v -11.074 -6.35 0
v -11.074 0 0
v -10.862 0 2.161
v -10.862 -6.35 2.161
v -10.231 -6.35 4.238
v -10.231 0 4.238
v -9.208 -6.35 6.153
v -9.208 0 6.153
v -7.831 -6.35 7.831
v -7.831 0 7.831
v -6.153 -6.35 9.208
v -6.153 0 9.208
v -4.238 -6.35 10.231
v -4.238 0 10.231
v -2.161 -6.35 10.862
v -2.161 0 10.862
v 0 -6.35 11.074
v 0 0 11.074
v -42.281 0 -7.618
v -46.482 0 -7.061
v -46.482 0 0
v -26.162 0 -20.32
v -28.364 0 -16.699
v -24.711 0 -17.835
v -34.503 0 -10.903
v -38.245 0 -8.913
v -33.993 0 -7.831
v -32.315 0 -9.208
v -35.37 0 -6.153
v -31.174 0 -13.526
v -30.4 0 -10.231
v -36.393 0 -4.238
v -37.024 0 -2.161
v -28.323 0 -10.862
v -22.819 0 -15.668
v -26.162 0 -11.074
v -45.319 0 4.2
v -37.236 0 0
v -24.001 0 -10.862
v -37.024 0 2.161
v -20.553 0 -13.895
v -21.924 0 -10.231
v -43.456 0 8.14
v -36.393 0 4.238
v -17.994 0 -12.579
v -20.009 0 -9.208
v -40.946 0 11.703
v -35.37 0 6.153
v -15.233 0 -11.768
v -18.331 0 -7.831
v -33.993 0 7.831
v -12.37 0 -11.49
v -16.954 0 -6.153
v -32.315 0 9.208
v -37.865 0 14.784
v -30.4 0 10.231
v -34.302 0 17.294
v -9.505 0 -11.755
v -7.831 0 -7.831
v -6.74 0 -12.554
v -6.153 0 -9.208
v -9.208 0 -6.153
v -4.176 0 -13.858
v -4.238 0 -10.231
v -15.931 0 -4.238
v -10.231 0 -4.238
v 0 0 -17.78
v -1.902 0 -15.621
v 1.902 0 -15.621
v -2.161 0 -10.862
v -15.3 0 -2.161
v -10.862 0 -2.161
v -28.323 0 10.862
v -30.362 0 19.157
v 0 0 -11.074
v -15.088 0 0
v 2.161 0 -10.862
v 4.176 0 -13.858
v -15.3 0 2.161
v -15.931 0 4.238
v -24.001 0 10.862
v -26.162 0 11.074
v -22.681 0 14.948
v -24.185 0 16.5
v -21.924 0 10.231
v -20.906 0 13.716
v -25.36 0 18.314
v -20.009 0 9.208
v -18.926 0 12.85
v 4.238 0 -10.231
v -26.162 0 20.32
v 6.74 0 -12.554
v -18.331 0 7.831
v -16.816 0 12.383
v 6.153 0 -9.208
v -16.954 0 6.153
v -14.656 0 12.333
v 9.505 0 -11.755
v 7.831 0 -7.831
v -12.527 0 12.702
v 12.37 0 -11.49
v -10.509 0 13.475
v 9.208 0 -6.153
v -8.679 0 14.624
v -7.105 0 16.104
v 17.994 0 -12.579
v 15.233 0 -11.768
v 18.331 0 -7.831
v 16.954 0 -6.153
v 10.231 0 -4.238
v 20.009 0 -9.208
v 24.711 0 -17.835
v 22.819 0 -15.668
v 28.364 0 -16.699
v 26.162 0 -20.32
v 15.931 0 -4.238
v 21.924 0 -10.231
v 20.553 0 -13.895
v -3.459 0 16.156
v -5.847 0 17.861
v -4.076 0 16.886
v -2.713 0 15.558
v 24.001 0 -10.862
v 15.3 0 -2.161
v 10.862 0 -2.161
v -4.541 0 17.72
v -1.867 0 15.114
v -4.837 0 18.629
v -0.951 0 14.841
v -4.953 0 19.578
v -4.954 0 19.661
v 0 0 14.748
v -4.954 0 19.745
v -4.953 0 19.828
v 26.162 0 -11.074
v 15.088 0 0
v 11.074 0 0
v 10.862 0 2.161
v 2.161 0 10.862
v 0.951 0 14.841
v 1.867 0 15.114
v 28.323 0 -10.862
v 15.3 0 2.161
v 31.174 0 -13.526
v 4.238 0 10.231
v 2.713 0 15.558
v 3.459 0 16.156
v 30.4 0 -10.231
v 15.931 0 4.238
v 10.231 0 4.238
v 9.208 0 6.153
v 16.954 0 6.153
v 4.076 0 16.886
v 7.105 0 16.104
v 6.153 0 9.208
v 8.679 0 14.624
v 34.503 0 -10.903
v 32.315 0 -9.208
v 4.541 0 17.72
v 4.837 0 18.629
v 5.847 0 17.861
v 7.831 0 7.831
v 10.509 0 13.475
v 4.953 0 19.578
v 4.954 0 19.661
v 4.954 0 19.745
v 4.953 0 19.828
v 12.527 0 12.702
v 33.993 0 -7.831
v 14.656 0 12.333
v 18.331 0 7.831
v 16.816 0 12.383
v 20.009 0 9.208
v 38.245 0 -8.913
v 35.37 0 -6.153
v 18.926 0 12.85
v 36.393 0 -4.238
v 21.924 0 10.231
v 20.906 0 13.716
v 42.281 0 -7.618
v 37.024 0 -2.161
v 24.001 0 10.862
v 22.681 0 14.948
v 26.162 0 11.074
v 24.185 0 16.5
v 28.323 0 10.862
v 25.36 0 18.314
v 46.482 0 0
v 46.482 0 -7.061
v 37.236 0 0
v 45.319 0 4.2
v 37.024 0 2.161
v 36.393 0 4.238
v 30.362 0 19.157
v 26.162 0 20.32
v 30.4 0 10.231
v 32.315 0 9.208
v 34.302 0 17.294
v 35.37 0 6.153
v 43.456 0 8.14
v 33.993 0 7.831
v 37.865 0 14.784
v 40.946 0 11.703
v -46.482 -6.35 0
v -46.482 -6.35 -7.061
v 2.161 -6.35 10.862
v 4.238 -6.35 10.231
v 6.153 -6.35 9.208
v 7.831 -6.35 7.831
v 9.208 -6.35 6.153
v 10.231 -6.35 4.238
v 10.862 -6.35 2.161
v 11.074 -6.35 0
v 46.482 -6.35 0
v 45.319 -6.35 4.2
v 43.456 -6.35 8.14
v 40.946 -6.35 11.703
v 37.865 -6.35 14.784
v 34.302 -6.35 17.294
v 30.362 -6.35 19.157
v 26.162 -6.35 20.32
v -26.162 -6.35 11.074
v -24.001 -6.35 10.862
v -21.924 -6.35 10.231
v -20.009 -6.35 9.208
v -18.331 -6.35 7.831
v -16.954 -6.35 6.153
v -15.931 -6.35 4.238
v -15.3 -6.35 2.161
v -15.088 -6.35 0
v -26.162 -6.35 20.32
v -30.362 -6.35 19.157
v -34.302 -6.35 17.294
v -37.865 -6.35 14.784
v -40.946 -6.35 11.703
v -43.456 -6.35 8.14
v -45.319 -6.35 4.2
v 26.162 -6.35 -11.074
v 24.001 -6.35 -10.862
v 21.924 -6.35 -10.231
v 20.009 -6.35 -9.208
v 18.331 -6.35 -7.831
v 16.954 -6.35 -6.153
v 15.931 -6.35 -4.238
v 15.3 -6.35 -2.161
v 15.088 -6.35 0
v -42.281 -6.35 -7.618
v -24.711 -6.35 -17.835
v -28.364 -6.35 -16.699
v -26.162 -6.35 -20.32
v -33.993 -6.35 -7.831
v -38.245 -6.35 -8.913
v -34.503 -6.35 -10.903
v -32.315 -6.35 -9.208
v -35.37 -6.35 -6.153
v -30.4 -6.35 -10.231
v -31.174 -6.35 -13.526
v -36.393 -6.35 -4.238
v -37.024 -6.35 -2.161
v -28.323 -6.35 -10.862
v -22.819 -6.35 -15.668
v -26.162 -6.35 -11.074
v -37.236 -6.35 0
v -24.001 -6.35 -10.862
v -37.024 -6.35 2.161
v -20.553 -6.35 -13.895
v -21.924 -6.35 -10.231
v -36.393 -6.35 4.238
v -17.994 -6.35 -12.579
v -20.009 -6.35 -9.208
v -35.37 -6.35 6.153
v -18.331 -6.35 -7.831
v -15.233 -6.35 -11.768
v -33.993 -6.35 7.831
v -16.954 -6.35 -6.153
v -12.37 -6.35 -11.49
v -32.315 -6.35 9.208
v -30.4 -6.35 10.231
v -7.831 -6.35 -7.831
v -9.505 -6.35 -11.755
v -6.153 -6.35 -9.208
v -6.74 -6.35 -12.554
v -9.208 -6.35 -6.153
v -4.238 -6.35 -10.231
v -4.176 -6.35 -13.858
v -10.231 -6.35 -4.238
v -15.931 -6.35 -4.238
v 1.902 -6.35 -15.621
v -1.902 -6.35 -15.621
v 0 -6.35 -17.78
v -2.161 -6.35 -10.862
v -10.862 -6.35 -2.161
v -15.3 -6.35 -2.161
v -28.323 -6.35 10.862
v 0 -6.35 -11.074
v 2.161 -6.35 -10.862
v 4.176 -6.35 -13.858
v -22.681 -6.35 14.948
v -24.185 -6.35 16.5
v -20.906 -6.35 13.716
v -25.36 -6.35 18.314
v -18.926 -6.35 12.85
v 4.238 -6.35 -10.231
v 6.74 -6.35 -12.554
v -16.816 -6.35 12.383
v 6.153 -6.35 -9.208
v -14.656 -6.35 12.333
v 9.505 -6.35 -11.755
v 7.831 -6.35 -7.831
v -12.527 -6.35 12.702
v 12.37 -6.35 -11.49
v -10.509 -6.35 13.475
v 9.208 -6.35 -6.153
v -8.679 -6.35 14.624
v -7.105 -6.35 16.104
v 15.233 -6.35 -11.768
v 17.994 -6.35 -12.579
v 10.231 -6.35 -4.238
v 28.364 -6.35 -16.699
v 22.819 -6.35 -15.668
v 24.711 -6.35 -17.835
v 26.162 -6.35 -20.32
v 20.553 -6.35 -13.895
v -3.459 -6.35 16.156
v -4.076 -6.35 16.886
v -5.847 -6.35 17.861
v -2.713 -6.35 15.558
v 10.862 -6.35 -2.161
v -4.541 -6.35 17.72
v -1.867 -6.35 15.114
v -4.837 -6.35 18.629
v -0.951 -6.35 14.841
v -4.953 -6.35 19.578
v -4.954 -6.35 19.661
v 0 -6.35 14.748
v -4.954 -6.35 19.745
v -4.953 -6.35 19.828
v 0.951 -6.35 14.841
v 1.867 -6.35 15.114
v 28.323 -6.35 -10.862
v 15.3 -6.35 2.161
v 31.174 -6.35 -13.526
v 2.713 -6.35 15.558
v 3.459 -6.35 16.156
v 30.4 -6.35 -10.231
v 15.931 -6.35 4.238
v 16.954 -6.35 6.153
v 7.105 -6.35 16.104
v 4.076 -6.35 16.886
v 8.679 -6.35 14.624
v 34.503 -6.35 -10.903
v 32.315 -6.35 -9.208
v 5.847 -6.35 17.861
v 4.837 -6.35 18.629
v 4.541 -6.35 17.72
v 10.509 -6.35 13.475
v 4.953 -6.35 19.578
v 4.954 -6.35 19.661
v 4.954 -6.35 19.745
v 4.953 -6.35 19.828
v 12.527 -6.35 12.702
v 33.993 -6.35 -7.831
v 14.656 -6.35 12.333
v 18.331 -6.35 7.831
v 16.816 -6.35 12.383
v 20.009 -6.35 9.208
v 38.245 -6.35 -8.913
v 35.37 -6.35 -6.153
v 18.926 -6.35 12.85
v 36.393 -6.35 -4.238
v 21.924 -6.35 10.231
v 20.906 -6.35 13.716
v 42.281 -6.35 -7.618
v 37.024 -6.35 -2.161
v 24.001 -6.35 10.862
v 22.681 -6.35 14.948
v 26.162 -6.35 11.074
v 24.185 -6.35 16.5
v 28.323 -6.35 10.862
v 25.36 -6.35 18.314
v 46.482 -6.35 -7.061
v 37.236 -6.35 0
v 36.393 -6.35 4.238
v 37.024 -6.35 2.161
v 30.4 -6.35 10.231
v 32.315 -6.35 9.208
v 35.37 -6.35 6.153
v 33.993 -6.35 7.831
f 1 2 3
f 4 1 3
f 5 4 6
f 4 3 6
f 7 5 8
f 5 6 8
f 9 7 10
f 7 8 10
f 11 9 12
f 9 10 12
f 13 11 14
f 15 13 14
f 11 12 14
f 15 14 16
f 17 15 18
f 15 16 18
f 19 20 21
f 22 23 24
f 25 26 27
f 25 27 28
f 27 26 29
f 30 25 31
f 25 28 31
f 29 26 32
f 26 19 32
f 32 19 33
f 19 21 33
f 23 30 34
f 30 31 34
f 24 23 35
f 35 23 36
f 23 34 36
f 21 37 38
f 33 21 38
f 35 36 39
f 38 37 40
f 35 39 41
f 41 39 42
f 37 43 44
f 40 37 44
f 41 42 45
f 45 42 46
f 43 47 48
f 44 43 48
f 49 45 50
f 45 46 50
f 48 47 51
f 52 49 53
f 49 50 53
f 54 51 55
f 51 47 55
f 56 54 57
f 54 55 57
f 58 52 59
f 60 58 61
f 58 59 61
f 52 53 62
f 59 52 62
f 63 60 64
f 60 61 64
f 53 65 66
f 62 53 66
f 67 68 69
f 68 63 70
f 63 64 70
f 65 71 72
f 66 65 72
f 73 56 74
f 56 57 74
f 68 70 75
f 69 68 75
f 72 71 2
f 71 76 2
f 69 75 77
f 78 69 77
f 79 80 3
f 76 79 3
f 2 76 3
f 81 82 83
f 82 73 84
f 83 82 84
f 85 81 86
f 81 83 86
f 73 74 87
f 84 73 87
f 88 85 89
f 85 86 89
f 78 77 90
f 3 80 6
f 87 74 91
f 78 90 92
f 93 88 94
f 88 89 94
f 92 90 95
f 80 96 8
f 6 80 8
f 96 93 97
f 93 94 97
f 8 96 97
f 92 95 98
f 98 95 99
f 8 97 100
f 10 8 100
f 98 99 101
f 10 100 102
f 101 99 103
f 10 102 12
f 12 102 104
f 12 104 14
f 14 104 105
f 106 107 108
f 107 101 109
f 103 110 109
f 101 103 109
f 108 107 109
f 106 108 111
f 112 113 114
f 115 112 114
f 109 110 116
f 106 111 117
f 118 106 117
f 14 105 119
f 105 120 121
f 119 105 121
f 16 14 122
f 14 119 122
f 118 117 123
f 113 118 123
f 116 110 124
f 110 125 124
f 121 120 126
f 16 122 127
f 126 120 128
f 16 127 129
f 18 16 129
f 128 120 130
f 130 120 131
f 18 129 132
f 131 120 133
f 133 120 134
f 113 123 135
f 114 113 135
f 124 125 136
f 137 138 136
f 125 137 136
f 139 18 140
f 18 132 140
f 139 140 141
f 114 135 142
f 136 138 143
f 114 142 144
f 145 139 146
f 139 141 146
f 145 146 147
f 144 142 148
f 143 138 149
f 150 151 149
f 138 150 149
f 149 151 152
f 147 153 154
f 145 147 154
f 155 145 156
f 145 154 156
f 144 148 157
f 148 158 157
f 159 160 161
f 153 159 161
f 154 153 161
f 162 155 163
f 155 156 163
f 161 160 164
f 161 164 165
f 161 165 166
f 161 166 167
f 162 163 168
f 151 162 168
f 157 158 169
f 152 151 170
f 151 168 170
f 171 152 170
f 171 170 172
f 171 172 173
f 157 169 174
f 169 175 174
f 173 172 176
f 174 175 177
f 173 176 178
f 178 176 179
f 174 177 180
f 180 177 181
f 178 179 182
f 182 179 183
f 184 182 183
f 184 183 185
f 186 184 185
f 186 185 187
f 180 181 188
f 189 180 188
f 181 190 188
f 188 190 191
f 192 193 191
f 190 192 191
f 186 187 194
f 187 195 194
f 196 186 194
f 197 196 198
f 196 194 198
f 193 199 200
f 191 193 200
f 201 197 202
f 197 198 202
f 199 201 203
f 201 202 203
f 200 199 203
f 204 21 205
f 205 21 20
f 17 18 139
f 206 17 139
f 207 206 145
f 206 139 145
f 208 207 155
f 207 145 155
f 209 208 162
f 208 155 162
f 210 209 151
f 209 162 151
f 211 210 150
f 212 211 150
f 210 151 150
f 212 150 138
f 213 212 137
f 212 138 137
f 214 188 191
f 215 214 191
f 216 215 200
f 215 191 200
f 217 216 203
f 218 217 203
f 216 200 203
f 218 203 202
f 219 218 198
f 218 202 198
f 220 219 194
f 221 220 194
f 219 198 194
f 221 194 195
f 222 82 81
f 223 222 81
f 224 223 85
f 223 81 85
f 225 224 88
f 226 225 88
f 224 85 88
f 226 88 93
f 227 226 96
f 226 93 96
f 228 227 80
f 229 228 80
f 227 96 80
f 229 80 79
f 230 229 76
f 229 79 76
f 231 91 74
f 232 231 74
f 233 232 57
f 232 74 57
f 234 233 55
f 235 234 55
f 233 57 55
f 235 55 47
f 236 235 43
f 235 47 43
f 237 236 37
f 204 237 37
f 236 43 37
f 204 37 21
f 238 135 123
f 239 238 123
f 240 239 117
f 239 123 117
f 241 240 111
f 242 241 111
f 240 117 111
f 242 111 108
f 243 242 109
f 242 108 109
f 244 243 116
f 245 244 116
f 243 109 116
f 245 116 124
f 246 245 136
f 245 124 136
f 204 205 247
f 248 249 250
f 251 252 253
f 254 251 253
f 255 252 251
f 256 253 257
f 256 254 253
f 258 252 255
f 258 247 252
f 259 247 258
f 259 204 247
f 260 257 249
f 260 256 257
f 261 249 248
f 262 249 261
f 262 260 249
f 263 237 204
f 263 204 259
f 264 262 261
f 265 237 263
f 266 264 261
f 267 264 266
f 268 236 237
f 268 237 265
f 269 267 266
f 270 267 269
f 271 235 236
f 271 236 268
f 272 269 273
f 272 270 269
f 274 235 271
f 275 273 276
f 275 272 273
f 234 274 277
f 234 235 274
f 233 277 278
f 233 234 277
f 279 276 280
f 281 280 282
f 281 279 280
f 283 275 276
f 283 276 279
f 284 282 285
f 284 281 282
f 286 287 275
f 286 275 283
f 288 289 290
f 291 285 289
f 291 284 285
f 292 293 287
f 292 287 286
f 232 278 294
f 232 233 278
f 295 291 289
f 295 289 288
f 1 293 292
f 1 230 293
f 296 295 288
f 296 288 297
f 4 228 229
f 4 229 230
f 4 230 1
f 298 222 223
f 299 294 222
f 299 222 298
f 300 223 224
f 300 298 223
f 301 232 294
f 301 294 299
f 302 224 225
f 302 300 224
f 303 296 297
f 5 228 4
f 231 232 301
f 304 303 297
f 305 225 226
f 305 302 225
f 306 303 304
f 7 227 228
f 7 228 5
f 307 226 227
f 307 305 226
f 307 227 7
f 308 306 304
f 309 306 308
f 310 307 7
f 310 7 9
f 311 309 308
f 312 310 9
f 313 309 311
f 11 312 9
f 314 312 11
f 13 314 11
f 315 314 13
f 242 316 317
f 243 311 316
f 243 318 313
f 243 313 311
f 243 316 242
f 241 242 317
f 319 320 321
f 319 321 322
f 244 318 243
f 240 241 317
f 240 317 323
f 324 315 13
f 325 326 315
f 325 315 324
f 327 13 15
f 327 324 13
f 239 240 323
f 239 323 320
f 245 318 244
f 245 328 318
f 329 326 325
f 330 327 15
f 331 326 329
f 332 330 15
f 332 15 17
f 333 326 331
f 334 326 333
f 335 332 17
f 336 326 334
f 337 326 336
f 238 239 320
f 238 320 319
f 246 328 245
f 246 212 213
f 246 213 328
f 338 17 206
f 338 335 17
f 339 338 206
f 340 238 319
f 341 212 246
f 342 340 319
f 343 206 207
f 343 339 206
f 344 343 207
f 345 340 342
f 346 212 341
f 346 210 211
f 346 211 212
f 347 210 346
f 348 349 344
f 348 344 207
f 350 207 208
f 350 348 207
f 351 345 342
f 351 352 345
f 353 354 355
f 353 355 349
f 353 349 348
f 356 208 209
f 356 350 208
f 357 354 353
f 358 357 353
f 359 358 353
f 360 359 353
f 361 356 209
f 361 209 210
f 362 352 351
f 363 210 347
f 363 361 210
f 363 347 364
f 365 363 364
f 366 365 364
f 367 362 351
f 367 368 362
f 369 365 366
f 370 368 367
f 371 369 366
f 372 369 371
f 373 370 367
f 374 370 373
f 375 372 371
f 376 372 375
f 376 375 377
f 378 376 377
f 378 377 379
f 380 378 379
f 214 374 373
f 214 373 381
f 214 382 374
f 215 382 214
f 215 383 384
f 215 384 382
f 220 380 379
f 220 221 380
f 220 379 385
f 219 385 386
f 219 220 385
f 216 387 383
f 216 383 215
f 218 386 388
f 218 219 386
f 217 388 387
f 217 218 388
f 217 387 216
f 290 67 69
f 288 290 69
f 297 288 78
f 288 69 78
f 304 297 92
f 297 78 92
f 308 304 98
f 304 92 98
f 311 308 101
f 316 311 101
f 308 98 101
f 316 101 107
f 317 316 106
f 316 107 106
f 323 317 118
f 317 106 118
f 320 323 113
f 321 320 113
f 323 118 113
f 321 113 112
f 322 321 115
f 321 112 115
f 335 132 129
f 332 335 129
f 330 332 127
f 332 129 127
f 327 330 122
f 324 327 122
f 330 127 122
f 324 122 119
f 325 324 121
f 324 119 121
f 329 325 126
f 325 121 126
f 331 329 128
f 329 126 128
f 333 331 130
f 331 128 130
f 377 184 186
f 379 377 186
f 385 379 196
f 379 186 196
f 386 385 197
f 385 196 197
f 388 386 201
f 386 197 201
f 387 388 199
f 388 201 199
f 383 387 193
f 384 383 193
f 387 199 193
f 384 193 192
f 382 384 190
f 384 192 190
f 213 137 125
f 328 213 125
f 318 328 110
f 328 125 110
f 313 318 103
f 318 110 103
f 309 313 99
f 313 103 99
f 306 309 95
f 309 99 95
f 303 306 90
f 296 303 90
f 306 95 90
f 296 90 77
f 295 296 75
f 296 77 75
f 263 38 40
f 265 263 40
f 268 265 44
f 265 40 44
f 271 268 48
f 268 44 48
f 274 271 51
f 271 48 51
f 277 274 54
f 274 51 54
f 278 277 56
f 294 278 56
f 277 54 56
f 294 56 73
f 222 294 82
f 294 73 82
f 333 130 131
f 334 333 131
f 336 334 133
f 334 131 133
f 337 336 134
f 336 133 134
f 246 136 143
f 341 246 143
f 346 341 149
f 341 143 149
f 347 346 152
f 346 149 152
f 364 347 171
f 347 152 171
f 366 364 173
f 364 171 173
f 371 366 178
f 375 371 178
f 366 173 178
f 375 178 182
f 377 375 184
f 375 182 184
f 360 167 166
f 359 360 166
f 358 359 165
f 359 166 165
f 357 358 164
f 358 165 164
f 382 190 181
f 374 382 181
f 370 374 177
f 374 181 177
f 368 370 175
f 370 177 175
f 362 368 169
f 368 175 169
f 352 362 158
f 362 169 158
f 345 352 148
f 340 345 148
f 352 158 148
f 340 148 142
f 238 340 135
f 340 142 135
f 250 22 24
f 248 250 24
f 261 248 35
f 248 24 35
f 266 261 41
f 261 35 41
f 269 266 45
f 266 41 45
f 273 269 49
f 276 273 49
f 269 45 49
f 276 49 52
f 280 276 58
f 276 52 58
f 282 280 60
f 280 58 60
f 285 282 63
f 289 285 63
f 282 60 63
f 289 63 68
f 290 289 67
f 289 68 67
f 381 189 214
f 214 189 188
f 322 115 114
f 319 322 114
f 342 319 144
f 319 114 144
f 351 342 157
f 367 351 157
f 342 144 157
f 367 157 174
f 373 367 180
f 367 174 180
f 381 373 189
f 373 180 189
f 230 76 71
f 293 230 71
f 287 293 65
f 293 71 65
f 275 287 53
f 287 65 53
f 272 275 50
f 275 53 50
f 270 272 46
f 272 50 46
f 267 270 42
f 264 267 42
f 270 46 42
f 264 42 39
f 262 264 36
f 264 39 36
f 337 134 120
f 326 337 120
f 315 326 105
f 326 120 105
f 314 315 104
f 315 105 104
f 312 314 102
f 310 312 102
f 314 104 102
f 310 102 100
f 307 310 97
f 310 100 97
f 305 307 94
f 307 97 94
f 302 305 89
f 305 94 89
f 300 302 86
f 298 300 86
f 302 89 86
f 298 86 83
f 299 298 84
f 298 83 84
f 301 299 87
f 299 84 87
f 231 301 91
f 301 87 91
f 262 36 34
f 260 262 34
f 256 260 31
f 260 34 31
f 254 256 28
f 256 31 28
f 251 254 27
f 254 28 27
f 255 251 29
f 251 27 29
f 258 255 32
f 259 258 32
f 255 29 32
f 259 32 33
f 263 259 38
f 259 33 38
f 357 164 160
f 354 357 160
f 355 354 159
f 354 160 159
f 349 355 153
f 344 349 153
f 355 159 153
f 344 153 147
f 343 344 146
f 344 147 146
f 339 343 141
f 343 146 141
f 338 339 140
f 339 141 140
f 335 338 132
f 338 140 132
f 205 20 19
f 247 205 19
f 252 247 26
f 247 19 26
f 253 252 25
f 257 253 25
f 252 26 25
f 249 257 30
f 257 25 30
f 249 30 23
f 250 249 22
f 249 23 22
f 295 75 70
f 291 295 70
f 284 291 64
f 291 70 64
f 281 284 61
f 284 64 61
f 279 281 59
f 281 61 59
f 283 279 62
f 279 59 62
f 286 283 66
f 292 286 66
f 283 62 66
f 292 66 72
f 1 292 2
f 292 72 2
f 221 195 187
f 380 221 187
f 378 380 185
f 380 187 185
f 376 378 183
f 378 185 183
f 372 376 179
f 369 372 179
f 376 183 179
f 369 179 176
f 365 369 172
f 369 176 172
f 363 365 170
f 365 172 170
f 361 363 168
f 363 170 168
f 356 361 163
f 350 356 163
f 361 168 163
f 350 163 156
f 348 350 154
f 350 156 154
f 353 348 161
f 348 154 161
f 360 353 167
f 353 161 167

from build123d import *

# Parameters (mm, degrees)
F1_DEPTH = 6.35


with BuildPart() as f1:
    # F0 (on Front) → F1 (new body)
    with BuildSketch(Plane.XZ):
        with BuildLine():
            ThreePointArc((-37.2364, 0), (-33.992783, 7.830783), (-26.162, 11.0744))
            Line((-26.162, 11.0744), (-26.162, 20.32))
            ThreePointArc((-26.162, 20.32), (-39.471894, 13.309894), (-46.482, 0))
            Line((-46.482, 0), (-37.2364, 0))
        make_face()
        with BuildLine():
            ThreePointArc((-46.482, -7.0612), (-34.50328, -10.90329), (-26.162, -20.32))
            Line((-26.162, -20.32), (-26.162, -11.0744))
            ThreePointArc((-26.162, -11.0744), (-33.992783, -7.830783), (-37.2364, 0))
            Line((-37.2364, 0), (-46.482, 0))
            Line((-46.482, 0), (-46.482, -7.0612))
        make_face()
        with BuildLine():
            Line((0, -17.78), (0, -11.0744))
            ThreePointArc((0, -11.0744), (-7.830783, -7.830783), (-11.0744, 0))
            Line((-11.0744, 0), (-15.0876, 0))
            ThreePointArc((-15.0876, 0), (-18.331217, -7.830783), (-26.162, -11.0744))
            Line((-26.162, -11.0744), (-26.162, -20.32))
            ThreePointArc((-26.162, -20.32), (-13.808095, -11.56092), (0, -17.78))
        make_face()
        with BuildLine():
            Line((15.0876, 0), (11.0744, 0))
            ThreePointArc((11.0744, 0), (7.830783, -7.830783), (0, -11.0744))
            Line((0, -11.0744), (0, -17.78))
            ThreePointArc((0, -17.78), (13.808095, -11.56092), (26.162, -20.32))
            Line((26.162, -20.32), (26.162, -11.0744))
            ThreePointArc((26.162, -11.0744), (18.331217, -7.830783), (15.0876, 0))
        make_face()
        with BuildLine():
            ThreePointArc((37.2364, 0), (33.992783, -7.830783), (26.162, -11.0744))
            Line((26.162, -11.0744), (26.162, -20.32))
            ThreePointArc((26.162, -20.32), (34.50328, -10.90329), (46.482, -7.0612))
            Line((46.482, -7.0612), (46.482, 0))
            Line((46.482, 0), (37.2364, 0))
        make_face()
        with BuildLine():
            Line((26.162, 20.32), (26.162, 11.0744))
            ThreePointArc((26.162, 11.0744), (33.992783, 7.830783), (37.2364, 0))
            Line((37.2364, 0), (46.482, 0))
            ThreePointArc((46.482, 0), (39.471894, 13.309894), (26.162, 20.32))
        make_face()
        with BuildLine():
            ThreePointArc((0, 11.0744), (7.830783, 7.830783), (11.0744, 0))
            Line((11.0744, 0), (15.0876, 0))
            ThreePointArc((15.0876, 0), (18.331217, 7.830783), (26.162, 11.0744))
            Line((26.162, 11.0744), (26.162, 20.32))
            ThreePointArc((26.162, 20.32), (15.737544, 12.305846), (4.953, 19.828449))
            ThreePointArc((4.953, 19.828449), (4.954587, 19.703036), (4.953, 19.577624))
            Line((4.953, 19.577624), (4.953, 14.748449))
            Line((4.953, 14.748449), (0, 14.748449))
            Line((0, 14.748449), (0, 11.0744))
        make_face()
        with BuildLine():
            ThreePointArc((-11.0744, 0), (-7.830783, 7.830783), (0, 11.0744))
            Line((0, 11.0744), (0, 14.748449))
            Line((0, 14.748449), (-4.953, 14.748449))
            Line((-4.953, 14.748449), (-4.953, 19.577624))
            ThreePointArc((-4.953, 19.577624), (-4.954587, 19.703036), (-4.953, 19.828449))
            ThreePointArc((-4.953, 19.828449), (-15.737544, 12.305846), (-26.162, 20.32))
            Line((-26.162, 20.32), (-26.162, 11.0744))
            ThreePointArc((-26.162, 11.0744), (-18.331217, 7.830783), (-15.0876, 0))
            Line((-15.0876, 0), (-11.0744, 0))
        make_face()
        with BuildLine():
            Line((-4.953, 14.748449), (0, 14.748449))
            ThreePointArc((0, 14.748449), (-3.458798, 16.155551), (-4.953, 19.577624))
            Line((-4.953, 19.577624), (-4.953, 14.748449))
        make_face()
        with BuildLine():
            ThreePointArc((4.953, 19.577624), (3.458798, 16.155551), (0, 14.748449))
            Line((0, 14.748449), (4.953, 14.748449))
            Line((4.953, 14.748449), (4.953, 19.577624))
        make_face()
    extrude(amount=F1_DEPTH)


solid = f1.part
